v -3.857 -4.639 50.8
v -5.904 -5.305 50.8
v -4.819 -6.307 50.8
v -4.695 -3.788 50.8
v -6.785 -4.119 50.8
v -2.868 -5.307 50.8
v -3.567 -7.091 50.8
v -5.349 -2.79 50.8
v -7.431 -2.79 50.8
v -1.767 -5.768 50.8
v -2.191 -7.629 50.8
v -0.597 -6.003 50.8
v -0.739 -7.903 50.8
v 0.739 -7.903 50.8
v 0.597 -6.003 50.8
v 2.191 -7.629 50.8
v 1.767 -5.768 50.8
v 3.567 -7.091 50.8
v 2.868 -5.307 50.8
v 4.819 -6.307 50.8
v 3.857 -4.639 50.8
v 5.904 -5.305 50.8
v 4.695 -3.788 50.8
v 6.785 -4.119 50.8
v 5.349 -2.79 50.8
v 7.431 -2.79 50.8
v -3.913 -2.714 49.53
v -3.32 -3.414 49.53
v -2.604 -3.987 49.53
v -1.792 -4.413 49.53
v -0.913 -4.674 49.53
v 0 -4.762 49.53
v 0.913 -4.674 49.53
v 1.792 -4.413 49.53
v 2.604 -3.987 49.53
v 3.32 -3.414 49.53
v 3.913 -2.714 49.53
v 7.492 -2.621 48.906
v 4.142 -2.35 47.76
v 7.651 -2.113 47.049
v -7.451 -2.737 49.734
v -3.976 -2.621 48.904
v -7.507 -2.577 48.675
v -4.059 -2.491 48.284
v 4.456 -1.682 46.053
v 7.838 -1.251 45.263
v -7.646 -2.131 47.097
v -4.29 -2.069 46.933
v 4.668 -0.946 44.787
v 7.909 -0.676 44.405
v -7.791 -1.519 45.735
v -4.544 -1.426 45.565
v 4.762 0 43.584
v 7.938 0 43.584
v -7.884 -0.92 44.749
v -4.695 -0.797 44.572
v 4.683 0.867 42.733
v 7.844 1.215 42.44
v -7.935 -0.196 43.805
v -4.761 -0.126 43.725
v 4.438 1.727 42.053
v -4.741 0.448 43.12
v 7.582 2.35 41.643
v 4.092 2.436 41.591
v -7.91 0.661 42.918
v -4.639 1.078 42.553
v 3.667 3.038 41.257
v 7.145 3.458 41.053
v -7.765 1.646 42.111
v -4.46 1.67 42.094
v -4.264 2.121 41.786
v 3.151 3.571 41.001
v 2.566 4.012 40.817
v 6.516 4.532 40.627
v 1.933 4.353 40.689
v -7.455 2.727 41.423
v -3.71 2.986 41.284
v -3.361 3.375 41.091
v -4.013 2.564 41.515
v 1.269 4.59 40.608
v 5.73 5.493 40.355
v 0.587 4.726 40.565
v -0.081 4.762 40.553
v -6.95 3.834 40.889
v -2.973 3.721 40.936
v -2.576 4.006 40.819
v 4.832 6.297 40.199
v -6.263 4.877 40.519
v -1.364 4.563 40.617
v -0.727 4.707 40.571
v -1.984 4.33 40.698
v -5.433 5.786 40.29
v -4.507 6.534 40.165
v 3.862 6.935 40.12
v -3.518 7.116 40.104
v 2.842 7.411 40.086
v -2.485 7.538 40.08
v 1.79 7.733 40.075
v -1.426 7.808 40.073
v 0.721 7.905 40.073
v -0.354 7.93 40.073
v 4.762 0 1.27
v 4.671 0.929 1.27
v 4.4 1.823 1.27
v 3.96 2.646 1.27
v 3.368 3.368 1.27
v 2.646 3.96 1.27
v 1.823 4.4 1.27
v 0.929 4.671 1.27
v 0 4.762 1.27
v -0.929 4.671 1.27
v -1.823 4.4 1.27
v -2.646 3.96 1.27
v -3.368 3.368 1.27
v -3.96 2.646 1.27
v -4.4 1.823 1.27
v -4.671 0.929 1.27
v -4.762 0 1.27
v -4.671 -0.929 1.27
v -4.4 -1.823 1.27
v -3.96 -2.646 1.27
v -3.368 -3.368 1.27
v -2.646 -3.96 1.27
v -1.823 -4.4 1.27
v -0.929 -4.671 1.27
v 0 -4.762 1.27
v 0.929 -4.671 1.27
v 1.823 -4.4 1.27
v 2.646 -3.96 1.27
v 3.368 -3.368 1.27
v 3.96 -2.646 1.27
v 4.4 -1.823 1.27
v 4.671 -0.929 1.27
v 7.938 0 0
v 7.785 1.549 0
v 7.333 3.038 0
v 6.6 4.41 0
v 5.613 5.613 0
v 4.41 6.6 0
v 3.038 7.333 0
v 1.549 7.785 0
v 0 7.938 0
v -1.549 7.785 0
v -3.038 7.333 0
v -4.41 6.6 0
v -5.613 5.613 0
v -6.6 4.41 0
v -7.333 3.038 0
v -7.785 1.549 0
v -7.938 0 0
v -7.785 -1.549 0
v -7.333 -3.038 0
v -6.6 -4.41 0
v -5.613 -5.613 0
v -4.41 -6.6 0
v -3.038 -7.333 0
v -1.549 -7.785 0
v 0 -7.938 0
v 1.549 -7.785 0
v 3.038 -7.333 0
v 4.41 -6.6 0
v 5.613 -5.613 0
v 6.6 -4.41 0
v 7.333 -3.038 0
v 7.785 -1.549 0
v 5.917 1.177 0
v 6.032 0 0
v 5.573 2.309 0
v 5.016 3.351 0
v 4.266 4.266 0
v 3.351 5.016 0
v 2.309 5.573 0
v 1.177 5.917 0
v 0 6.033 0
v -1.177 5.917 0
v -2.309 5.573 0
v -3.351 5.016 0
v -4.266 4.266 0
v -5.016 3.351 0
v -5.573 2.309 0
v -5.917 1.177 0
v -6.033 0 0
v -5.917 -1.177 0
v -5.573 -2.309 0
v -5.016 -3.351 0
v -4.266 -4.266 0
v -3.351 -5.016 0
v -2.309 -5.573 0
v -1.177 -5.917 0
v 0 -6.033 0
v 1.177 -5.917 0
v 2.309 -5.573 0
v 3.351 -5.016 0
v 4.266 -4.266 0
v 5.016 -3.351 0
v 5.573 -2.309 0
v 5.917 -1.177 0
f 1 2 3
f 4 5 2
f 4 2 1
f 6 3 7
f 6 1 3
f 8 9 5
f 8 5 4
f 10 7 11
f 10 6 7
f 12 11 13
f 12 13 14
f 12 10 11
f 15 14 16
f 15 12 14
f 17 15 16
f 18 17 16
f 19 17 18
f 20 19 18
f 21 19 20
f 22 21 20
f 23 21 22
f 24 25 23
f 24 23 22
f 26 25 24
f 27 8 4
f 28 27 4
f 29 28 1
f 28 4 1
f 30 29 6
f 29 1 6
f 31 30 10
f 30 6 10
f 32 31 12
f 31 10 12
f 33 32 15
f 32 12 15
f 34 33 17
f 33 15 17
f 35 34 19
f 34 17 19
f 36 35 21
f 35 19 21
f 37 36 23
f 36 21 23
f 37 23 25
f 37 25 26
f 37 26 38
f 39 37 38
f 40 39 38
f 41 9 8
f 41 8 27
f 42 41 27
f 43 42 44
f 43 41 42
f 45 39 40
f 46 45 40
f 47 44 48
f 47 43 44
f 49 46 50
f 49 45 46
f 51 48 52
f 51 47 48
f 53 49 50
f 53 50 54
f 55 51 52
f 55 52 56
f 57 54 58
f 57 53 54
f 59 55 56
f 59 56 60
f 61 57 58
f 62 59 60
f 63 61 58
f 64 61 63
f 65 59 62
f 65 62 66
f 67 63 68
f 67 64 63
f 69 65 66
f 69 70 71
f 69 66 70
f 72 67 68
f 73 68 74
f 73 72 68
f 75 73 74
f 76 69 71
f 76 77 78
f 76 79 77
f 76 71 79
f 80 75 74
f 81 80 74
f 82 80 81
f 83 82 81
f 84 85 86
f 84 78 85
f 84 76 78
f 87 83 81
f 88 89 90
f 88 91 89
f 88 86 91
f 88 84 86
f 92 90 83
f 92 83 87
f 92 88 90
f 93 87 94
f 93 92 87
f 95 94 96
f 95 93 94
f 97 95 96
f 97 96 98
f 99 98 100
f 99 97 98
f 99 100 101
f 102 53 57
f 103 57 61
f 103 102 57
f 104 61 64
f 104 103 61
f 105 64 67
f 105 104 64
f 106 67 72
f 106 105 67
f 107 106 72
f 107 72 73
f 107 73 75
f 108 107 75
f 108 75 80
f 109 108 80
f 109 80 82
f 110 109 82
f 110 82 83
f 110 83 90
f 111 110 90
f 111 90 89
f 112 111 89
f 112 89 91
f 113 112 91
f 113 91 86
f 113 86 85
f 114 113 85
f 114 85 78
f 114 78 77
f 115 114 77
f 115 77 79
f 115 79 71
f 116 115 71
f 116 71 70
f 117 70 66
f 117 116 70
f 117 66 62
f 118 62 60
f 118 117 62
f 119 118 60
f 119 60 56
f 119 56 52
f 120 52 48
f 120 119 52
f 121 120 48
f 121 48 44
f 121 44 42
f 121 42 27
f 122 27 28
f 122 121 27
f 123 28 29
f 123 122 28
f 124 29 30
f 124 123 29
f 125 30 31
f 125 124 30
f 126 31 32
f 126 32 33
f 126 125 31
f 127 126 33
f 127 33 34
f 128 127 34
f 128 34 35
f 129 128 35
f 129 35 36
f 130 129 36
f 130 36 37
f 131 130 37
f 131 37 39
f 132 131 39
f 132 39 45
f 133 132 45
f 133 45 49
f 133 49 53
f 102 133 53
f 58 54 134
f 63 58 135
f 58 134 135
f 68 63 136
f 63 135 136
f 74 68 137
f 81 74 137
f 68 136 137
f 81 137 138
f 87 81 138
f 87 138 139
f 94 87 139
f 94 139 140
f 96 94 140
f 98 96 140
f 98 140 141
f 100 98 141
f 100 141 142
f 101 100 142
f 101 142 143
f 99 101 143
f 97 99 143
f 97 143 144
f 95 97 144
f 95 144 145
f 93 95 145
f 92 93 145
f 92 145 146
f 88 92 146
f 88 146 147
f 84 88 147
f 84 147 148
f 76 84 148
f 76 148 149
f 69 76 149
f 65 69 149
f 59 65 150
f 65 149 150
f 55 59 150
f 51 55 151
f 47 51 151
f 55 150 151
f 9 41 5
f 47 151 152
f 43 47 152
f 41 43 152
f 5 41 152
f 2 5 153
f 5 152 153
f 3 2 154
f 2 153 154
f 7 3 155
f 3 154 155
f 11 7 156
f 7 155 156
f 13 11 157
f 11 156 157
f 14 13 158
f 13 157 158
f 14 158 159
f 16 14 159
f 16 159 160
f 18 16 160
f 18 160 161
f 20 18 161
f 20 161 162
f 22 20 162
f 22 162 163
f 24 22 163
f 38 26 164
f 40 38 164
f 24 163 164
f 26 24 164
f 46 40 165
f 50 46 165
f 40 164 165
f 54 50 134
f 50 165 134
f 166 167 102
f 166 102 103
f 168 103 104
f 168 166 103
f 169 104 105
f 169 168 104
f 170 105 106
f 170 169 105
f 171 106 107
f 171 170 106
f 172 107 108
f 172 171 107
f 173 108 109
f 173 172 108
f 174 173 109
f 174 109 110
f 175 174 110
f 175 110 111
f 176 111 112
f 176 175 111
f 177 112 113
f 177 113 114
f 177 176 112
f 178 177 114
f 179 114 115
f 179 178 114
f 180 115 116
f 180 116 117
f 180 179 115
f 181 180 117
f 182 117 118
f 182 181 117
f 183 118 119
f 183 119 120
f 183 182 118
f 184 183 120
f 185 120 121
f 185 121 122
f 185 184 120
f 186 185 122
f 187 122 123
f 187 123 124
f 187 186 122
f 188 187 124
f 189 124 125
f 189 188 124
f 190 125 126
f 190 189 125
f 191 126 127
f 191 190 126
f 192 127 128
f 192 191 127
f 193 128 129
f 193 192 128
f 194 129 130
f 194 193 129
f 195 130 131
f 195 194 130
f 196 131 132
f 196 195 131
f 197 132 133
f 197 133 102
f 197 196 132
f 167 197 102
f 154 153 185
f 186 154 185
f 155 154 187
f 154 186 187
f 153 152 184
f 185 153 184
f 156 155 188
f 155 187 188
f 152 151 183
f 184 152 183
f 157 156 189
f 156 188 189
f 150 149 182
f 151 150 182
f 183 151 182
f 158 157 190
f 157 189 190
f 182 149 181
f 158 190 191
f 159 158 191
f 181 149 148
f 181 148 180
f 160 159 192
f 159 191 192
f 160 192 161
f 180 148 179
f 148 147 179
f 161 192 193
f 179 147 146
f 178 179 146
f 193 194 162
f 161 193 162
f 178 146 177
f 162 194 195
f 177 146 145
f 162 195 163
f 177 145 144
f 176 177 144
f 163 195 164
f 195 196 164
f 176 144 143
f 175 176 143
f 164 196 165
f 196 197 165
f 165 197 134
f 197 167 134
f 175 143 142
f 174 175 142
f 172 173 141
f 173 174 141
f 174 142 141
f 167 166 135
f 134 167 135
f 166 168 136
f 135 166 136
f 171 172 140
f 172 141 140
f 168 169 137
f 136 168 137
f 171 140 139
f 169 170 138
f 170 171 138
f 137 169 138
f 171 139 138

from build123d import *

# Parameters (mm, degrees)
SKETCH2_R             = 7.9375
SKETCH2_R_2           = 4.7625
TUBE_DEPTH            = 50.8
CHAMFER1_SIZE         = 1.27
CURVED_CUT_DEPTH      = 53.025453506
CURVED_CUT_DEPTH_BACK = 53.025453506
SKETCH3_R             = 10.727398282


with BuildPart() as part:
    # Sketch2 → tube (new body)
    with BuildSketch(Plane.XY):
        Circle(SKETCH2_R)
        Circle(SKETCH2_R_2, mode=Mode.SUBTRACT)
    extrude(amount=TUBE_DEPTH)

    # Chamfer1
    chamfer1_edges = [part.edges().sort_by_distance(p)[0] for p in [
        (-4.7625, 0, 0),
        (-4.7625, 0, 50.8),
    ]]
    chamfer(chamfer1_edges, length=CHAMFER1_SIZE)

    # Sketch3 → curved_cut (cut, two sides: drawn at the far end of the back side and taken through both)
    with BuildSketch(Plane(origin=(0, 0, 0), x_dir=(0, 0, -1), z_dir=(1, 0, 0)).offset(-CURVED_CUT_DEPTH_BACK)):
        with Locations((-50.8, 7.9375)):
            Circle(SKETCH3_R)
    extrude(amount=CURVED_CUT_DEPTH + CURVED_CUT_DEPTH_BACK, mode=Mode.SUBTRACT)


solid = part.part
